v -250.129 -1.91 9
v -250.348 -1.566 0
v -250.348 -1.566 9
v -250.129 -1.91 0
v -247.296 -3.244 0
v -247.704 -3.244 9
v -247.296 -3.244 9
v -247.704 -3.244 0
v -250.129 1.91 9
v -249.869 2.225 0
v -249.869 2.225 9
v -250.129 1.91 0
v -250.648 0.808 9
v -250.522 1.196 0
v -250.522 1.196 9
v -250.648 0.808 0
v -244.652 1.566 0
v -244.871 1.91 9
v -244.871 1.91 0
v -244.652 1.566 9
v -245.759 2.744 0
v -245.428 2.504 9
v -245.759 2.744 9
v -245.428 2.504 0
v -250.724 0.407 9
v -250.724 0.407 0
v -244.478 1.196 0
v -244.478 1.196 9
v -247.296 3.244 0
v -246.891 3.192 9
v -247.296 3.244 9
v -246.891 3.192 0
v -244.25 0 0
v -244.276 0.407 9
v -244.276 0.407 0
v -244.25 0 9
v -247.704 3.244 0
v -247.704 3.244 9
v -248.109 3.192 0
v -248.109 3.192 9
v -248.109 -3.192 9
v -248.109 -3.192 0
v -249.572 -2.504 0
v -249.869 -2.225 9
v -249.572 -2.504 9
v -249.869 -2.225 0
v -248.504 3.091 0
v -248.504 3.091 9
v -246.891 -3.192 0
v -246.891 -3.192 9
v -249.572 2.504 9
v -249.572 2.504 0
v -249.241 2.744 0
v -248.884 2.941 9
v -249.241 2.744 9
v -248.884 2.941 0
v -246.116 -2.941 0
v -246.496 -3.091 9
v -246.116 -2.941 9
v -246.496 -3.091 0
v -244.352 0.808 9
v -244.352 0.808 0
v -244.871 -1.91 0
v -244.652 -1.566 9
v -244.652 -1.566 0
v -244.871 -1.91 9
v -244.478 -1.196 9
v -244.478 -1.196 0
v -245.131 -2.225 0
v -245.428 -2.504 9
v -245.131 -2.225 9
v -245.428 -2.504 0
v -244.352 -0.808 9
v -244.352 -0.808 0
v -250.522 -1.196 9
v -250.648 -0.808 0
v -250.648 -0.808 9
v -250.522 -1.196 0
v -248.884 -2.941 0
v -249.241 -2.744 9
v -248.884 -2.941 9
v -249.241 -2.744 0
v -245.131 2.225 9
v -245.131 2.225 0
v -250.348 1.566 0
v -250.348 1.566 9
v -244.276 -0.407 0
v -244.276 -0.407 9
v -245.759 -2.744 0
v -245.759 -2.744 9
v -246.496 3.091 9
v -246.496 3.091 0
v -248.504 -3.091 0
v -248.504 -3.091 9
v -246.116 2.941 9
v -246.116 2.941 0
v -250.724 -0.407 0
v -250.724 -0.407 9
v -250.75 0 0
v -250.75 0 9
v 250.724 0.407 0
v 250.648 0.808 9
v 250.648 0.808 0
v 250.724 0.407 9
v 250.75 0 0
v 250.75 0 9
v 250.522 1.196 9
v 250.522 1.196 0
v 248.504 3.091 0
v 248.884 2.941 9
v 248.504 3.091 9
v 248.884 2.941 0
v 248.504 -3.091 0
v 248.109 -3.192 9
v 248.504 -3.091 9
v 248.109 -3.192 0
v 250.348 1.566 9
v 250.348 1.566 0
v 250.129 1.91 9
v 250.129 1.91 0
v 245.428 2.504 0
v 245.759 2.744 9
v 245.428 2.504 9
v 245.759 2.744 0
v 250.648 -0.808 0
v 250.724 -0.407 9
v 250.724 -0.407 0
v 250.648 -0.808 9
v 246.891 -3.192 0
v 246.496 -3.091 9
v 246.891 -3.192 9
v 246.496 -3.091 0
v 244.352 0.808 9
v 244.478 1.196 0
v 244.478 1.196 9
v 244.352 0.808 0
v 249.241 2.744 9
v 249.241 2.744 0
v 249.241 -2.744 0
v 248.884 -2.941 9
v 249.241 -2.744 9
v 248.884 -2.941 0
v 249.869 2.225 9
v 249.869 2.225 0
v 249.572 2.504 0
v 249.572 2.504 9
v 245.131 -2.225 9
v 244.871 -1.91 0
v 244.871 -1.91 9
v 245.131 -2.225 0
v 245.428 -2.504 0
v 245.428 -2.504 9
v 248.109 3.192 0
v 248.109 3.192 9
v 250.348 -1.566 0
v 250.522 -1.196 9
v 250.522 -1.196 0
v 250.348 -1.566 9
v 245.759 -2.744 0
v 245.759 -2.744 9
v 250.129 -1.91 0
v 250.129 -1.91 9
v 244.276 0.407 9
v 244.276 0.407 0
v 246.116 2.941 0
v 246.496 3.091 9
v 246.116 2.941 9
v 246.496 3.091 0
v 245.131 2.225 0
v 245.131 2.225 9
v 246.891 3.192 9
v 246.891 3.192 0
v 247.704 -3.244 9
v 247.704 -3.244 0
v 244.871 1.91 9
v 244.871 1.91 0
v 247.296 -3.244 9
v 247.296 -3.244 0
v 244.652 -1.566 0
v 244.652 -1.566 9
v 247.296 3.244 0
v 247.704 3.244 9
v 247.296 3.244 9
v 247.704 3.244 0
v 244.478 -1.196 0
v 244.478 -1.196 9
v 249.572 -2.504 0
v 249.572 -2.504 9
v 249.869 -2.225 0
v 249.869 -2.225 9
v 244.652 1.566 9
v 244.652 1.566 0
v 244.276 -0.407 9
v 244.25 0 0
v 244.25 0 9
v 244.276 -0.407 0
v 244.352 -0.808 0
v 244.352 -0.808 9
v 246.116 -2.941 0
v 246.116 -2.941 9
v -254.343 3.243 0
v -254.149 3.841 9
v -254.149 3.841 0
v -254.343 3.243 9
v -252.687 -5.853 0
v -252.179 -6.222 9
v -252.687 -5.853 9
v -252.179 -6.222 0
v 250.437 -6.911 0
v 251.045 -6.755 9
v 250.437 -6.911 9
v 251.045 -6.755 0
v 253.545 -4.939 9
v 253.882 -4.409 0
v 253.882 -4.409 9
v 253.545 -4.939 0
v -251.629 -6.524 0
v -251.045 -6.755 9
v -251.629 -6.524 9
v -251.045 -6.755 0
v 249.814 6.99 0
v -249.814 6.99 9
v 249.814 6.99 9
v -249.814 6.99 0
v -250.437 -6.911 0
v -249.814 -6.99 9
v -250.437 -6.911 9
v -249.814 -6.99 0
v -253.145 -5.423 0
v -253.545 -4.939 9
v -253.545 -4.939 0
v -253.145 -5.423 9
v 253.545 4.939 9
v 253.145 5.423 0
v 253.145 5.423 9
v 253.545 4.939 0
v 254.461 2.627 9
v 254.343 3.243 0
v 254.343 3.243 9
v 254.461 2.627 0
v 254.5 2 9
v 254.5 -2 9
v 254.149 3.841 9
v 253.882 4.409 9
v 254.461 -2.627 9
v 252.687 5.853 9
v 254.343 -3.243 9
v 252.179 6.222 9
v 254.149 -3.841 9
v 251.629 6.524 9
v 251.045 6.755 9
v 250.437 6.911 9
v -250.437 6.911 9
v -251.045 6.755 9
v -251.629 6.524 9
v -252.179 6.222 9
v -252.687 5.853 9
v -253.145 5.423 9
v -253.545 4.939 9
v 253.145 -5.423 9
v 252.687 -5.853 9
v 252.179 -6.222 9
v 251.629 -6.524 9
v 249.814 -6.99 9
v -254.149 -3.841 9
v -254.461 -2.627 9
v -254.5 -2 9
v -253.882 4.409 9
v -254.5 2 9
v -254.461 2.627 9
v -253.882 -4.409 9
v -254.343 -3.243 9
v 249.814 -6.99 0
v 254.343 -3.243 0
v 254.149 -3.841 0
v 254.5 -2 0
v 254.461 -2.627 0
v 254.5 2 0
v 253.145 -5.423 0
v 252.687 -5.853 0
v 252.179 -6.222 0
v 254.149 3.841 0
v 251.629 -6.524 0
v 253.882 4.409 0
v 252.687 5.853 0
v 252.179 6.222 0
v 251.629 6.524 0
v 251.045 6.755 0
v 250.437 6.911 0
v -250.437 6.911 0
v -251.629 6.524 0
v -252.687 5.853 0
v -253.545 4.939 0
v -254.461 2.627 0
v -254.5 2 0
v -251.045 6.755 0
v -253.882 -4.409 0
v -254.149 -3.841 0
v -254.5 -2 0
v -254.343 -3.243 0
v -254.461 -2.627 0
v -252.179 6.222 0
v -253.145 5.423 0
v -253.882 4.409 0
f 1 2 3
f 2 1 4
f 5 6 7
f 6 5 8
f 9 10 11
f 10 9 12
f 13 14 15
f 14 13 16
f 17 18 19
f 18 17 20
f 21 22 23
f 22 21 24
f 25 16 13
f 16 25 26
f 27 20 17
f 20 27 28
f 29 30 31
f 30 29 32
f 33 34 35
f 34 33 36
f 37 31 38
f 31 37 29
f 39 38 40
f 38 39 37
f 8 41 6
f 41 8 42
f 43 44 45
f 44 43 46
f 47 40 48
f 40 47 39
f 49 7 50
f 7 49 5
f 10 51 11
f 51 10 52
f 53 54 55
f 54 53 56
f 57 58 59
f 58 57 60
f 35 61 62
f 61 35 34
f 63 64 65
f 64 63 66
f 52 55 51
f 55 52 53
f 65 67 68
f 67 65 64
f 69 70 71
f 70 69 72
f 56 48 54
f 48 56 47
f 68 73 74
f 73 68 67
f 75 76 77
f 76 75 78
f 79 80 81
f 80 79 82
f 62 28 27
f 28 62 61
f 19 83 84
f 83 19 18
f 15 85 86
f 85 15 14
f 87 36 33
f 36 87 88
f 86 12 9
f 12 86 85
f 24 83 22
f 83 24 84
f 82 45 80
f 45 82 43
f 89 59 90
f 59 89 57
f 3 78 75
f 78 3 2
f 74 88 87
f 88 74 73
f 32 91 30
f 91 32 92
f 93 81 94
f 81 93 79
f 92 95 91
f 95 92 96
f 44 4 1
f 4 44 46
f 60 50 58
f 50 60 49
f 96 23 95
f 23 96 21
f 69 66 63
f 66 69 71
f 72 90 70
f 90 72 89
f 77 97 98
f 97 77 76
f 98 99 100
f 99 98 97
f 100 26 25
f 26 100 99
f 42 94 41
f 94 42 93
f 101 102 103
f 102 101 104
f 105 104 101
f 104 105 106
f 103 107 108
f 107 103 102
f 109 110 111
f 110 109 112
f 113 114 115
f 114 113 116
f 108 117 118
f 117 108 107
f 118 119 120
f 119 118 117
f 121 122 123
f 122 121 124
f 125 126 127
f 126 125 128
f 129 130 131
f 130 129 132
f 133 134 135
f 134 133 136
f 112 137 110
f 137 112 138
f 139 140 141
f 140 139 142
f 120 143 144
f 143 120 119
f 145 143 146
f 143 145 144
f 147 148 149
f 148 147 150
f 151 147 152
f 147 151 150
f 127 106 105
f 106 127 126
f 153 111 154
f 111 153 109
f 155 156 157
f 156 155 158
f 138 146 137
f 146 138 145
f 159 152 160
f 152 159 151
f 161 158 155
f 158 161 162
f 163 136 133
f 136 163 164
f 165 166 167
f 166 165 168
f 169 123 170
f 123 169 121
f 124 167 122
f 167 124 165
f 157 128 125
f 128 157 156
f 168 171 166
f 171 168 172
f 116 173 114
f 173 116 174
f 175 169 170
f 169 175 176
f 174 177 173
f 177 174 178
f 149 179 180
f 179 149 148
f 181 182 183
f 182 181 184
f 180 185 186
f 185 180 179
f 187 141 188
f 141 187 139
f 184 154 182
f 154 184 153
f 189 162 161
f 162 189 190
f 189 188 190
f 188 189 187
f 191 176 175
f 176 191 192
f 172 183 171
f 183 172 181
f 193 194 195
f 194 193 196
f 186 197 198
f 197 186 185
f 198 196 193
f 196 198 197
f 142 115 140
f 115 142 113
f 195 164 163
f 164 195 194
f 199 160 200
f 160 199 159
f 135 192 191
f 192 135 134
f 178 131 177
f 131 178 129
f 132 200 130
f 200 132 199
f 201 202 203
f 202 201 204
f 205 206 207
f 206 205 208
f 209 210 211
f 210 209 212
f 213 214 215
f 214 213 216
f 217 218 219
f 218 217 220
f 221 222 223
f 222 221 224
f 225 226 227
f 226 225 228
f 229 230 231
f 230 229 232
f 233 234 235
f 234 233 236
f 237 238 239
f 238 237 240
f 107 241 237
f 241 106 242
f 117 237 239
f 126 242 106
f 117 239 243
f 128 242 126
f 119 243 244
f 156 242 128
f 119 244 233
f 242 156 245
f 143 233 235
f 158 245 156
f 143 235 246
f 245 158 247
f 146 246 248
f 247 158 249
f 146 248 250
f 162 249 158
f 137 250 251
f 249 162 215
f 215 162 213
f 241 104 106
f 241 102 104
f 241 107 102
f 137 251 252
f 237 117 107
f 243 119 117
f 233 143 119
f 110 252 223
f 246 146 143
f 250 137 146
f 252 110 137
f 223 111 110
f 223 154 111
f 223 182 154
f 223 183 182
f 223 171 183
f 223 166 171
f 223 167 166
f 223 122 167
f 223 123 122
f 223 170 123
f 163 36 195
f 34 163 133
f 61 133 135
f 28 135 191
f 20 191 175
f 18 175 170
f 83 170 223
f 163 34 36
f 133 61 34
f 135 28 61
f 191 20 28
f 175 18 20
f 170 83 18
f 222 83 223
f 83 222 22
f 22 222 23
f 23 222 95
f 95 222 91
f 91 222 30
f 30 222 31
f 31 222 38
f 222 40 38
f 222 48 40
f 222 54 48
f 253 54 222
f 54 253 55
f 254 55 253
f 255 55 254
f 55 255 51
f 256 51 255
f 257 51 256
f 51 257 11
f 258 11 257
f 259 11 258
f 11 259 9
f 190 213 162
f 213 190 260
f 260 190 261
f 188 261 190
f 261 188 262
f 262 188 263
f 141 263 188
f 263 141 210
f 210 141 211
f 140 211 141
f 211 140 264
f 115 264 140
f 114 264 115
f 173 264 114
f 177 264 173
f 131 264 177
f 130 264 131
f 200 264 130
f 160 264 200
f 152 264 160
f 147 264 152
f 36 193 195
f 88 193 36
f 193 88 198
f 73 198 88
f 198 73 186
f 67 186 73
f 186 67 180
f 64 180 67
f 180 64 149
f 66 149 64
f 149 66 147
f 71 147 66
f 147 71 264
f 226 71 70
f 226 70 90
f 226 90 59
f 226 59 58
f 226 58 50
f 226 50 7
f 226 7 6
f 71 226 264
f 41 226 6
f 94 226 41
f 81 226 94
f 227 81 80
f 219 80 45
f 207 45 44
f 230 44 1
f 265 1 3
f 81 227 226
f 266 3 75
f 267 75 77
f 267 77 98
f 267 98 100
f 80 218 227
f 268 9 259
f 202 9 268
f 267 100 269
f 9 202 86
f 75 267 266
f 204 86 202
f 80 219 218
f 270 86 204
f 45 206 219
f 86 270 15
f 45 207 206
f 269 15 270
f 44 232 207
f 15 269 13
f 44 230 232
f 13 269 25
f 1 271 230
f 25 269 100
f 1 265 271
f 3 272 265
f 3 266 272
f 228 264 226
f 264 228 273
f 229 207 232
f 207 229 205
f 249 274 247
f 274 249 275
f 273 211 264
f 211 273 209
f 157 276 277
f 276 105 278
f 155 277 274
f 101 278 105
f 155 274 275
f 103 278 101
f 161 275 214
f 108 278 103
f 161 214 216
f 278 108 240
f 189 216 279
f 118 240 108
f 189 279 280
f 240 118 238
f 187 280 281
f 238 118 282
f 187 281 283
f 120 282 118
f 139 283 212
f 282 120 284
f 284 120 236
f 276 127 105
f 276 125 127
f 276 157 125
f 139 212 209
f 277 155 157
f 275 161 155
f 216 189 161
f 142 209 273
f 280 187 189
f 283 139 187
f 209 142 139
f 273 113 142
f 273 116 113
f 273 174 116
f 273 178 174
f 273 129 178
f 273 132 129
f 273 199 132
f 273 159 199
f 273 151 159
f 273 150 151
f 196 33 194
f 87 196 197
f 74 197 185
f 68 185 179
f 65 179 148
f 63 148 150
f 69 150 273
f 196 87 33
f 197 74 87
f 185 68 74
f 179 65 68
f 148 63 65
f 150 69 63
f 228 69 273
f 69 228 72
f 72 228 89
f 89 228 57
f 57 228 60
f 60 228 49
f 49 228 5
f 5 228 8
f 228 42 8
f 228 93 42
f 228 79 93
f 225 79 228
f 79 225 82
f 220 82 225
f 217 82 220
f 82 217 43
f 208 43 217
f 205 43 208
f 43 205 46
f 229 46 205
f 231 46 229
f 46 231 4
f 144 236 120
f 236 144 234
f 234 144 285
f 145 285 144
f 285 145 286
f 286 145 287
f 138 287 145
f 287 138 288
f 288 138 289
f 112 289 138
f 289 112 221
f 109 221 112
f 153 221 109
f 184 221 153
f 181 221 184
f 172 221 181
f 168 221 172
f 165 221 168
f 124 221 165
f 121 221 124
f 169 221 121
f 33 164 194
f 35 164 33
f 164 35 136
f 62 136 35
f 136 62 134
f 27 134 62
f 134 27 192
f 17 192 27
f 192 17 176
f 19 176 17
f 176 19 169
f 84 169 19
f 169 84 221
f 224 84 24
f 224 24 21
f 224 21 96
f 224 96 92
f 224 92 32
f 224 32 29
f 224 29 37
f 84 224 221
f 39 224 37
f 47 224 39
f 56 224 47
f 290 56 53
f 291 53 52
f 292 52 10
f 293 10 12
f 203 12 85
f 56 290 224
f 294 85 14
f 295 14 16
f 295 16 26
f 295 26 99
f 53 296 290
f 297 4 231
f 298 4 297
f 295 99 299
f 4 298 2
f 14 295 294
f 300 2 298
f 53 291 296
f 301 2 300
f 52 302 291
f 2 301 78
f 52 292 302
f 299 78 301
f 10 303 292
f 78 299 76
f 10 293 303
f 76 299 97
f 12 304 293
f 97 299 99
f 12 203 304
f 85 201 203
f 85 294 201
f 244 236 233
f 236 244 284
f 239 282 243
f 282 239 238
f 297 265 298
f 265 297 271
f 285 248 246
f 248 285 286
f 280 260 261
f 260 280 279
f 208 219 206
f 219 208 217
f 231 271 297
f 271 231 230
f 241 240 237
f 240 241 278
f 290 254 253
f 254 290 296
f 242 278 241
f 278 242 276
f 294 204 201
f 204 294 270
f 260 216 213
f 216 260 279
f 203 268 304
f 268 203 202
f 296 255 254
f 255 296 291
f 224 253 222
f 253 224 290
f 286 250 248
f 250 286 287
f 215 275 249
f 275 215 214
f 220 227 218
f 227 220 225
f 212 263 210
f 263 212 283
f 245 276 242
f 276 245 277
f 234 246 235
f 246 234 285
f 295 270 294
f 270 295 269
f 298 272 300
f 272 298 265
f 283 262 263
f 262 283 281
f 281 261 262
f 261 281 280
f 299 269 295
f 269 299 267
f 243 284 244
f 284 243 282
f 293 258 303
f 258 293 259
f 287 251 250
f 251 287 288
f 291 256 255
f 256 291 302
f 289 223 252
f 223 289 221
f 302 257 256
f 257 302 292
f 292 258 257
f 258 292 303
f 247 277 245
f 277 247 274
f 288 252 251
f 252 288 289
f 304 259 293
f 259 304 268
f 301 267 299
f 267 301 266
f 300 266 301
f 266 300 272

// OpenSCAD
$fn = 50;


difference() {
	union() {
		hull() {
			translate(v = [-249.5000000000, 2.0000000000, 0]) {
				cylinder(h = 9, r = 5);
			}
			translate(v = [249.5000000000, 2.0000000000, 0]) {
				cylinder(h = 9, r = 5);
			}
			translate(v = [-249.5000000000, -2.0000000000, 0]) {
				cylinder(h = 9, r = 5);
			}
			translate(v = [249.5000000000, -2.0000000000, 0]) {
				cylinder(h = 9, r = 5);
			}
		}
	}
	union() {
		translate(v = [-247.5000000000, 0.0000000000, -100.0000000000]) {
			cylinder(h = 200, r = 3.2500000000);
		}
		translate(v = [-247.5000000000, 0.0000000000, -100.0000000000]) {
			cylinder(h = 200, r = 3.2500000000);
		}
		translate(v = [247.5000000000, 0.0000000000, -100.0000000000]) {
			cylinder(h = 200, r = 3.2500000000);
		}
		translate(v = [247.5000000000, 0.0000000000, -100.0000000000]) {
			cylinder(h = 200, r = 3.2500000000);
		}
	}
}
